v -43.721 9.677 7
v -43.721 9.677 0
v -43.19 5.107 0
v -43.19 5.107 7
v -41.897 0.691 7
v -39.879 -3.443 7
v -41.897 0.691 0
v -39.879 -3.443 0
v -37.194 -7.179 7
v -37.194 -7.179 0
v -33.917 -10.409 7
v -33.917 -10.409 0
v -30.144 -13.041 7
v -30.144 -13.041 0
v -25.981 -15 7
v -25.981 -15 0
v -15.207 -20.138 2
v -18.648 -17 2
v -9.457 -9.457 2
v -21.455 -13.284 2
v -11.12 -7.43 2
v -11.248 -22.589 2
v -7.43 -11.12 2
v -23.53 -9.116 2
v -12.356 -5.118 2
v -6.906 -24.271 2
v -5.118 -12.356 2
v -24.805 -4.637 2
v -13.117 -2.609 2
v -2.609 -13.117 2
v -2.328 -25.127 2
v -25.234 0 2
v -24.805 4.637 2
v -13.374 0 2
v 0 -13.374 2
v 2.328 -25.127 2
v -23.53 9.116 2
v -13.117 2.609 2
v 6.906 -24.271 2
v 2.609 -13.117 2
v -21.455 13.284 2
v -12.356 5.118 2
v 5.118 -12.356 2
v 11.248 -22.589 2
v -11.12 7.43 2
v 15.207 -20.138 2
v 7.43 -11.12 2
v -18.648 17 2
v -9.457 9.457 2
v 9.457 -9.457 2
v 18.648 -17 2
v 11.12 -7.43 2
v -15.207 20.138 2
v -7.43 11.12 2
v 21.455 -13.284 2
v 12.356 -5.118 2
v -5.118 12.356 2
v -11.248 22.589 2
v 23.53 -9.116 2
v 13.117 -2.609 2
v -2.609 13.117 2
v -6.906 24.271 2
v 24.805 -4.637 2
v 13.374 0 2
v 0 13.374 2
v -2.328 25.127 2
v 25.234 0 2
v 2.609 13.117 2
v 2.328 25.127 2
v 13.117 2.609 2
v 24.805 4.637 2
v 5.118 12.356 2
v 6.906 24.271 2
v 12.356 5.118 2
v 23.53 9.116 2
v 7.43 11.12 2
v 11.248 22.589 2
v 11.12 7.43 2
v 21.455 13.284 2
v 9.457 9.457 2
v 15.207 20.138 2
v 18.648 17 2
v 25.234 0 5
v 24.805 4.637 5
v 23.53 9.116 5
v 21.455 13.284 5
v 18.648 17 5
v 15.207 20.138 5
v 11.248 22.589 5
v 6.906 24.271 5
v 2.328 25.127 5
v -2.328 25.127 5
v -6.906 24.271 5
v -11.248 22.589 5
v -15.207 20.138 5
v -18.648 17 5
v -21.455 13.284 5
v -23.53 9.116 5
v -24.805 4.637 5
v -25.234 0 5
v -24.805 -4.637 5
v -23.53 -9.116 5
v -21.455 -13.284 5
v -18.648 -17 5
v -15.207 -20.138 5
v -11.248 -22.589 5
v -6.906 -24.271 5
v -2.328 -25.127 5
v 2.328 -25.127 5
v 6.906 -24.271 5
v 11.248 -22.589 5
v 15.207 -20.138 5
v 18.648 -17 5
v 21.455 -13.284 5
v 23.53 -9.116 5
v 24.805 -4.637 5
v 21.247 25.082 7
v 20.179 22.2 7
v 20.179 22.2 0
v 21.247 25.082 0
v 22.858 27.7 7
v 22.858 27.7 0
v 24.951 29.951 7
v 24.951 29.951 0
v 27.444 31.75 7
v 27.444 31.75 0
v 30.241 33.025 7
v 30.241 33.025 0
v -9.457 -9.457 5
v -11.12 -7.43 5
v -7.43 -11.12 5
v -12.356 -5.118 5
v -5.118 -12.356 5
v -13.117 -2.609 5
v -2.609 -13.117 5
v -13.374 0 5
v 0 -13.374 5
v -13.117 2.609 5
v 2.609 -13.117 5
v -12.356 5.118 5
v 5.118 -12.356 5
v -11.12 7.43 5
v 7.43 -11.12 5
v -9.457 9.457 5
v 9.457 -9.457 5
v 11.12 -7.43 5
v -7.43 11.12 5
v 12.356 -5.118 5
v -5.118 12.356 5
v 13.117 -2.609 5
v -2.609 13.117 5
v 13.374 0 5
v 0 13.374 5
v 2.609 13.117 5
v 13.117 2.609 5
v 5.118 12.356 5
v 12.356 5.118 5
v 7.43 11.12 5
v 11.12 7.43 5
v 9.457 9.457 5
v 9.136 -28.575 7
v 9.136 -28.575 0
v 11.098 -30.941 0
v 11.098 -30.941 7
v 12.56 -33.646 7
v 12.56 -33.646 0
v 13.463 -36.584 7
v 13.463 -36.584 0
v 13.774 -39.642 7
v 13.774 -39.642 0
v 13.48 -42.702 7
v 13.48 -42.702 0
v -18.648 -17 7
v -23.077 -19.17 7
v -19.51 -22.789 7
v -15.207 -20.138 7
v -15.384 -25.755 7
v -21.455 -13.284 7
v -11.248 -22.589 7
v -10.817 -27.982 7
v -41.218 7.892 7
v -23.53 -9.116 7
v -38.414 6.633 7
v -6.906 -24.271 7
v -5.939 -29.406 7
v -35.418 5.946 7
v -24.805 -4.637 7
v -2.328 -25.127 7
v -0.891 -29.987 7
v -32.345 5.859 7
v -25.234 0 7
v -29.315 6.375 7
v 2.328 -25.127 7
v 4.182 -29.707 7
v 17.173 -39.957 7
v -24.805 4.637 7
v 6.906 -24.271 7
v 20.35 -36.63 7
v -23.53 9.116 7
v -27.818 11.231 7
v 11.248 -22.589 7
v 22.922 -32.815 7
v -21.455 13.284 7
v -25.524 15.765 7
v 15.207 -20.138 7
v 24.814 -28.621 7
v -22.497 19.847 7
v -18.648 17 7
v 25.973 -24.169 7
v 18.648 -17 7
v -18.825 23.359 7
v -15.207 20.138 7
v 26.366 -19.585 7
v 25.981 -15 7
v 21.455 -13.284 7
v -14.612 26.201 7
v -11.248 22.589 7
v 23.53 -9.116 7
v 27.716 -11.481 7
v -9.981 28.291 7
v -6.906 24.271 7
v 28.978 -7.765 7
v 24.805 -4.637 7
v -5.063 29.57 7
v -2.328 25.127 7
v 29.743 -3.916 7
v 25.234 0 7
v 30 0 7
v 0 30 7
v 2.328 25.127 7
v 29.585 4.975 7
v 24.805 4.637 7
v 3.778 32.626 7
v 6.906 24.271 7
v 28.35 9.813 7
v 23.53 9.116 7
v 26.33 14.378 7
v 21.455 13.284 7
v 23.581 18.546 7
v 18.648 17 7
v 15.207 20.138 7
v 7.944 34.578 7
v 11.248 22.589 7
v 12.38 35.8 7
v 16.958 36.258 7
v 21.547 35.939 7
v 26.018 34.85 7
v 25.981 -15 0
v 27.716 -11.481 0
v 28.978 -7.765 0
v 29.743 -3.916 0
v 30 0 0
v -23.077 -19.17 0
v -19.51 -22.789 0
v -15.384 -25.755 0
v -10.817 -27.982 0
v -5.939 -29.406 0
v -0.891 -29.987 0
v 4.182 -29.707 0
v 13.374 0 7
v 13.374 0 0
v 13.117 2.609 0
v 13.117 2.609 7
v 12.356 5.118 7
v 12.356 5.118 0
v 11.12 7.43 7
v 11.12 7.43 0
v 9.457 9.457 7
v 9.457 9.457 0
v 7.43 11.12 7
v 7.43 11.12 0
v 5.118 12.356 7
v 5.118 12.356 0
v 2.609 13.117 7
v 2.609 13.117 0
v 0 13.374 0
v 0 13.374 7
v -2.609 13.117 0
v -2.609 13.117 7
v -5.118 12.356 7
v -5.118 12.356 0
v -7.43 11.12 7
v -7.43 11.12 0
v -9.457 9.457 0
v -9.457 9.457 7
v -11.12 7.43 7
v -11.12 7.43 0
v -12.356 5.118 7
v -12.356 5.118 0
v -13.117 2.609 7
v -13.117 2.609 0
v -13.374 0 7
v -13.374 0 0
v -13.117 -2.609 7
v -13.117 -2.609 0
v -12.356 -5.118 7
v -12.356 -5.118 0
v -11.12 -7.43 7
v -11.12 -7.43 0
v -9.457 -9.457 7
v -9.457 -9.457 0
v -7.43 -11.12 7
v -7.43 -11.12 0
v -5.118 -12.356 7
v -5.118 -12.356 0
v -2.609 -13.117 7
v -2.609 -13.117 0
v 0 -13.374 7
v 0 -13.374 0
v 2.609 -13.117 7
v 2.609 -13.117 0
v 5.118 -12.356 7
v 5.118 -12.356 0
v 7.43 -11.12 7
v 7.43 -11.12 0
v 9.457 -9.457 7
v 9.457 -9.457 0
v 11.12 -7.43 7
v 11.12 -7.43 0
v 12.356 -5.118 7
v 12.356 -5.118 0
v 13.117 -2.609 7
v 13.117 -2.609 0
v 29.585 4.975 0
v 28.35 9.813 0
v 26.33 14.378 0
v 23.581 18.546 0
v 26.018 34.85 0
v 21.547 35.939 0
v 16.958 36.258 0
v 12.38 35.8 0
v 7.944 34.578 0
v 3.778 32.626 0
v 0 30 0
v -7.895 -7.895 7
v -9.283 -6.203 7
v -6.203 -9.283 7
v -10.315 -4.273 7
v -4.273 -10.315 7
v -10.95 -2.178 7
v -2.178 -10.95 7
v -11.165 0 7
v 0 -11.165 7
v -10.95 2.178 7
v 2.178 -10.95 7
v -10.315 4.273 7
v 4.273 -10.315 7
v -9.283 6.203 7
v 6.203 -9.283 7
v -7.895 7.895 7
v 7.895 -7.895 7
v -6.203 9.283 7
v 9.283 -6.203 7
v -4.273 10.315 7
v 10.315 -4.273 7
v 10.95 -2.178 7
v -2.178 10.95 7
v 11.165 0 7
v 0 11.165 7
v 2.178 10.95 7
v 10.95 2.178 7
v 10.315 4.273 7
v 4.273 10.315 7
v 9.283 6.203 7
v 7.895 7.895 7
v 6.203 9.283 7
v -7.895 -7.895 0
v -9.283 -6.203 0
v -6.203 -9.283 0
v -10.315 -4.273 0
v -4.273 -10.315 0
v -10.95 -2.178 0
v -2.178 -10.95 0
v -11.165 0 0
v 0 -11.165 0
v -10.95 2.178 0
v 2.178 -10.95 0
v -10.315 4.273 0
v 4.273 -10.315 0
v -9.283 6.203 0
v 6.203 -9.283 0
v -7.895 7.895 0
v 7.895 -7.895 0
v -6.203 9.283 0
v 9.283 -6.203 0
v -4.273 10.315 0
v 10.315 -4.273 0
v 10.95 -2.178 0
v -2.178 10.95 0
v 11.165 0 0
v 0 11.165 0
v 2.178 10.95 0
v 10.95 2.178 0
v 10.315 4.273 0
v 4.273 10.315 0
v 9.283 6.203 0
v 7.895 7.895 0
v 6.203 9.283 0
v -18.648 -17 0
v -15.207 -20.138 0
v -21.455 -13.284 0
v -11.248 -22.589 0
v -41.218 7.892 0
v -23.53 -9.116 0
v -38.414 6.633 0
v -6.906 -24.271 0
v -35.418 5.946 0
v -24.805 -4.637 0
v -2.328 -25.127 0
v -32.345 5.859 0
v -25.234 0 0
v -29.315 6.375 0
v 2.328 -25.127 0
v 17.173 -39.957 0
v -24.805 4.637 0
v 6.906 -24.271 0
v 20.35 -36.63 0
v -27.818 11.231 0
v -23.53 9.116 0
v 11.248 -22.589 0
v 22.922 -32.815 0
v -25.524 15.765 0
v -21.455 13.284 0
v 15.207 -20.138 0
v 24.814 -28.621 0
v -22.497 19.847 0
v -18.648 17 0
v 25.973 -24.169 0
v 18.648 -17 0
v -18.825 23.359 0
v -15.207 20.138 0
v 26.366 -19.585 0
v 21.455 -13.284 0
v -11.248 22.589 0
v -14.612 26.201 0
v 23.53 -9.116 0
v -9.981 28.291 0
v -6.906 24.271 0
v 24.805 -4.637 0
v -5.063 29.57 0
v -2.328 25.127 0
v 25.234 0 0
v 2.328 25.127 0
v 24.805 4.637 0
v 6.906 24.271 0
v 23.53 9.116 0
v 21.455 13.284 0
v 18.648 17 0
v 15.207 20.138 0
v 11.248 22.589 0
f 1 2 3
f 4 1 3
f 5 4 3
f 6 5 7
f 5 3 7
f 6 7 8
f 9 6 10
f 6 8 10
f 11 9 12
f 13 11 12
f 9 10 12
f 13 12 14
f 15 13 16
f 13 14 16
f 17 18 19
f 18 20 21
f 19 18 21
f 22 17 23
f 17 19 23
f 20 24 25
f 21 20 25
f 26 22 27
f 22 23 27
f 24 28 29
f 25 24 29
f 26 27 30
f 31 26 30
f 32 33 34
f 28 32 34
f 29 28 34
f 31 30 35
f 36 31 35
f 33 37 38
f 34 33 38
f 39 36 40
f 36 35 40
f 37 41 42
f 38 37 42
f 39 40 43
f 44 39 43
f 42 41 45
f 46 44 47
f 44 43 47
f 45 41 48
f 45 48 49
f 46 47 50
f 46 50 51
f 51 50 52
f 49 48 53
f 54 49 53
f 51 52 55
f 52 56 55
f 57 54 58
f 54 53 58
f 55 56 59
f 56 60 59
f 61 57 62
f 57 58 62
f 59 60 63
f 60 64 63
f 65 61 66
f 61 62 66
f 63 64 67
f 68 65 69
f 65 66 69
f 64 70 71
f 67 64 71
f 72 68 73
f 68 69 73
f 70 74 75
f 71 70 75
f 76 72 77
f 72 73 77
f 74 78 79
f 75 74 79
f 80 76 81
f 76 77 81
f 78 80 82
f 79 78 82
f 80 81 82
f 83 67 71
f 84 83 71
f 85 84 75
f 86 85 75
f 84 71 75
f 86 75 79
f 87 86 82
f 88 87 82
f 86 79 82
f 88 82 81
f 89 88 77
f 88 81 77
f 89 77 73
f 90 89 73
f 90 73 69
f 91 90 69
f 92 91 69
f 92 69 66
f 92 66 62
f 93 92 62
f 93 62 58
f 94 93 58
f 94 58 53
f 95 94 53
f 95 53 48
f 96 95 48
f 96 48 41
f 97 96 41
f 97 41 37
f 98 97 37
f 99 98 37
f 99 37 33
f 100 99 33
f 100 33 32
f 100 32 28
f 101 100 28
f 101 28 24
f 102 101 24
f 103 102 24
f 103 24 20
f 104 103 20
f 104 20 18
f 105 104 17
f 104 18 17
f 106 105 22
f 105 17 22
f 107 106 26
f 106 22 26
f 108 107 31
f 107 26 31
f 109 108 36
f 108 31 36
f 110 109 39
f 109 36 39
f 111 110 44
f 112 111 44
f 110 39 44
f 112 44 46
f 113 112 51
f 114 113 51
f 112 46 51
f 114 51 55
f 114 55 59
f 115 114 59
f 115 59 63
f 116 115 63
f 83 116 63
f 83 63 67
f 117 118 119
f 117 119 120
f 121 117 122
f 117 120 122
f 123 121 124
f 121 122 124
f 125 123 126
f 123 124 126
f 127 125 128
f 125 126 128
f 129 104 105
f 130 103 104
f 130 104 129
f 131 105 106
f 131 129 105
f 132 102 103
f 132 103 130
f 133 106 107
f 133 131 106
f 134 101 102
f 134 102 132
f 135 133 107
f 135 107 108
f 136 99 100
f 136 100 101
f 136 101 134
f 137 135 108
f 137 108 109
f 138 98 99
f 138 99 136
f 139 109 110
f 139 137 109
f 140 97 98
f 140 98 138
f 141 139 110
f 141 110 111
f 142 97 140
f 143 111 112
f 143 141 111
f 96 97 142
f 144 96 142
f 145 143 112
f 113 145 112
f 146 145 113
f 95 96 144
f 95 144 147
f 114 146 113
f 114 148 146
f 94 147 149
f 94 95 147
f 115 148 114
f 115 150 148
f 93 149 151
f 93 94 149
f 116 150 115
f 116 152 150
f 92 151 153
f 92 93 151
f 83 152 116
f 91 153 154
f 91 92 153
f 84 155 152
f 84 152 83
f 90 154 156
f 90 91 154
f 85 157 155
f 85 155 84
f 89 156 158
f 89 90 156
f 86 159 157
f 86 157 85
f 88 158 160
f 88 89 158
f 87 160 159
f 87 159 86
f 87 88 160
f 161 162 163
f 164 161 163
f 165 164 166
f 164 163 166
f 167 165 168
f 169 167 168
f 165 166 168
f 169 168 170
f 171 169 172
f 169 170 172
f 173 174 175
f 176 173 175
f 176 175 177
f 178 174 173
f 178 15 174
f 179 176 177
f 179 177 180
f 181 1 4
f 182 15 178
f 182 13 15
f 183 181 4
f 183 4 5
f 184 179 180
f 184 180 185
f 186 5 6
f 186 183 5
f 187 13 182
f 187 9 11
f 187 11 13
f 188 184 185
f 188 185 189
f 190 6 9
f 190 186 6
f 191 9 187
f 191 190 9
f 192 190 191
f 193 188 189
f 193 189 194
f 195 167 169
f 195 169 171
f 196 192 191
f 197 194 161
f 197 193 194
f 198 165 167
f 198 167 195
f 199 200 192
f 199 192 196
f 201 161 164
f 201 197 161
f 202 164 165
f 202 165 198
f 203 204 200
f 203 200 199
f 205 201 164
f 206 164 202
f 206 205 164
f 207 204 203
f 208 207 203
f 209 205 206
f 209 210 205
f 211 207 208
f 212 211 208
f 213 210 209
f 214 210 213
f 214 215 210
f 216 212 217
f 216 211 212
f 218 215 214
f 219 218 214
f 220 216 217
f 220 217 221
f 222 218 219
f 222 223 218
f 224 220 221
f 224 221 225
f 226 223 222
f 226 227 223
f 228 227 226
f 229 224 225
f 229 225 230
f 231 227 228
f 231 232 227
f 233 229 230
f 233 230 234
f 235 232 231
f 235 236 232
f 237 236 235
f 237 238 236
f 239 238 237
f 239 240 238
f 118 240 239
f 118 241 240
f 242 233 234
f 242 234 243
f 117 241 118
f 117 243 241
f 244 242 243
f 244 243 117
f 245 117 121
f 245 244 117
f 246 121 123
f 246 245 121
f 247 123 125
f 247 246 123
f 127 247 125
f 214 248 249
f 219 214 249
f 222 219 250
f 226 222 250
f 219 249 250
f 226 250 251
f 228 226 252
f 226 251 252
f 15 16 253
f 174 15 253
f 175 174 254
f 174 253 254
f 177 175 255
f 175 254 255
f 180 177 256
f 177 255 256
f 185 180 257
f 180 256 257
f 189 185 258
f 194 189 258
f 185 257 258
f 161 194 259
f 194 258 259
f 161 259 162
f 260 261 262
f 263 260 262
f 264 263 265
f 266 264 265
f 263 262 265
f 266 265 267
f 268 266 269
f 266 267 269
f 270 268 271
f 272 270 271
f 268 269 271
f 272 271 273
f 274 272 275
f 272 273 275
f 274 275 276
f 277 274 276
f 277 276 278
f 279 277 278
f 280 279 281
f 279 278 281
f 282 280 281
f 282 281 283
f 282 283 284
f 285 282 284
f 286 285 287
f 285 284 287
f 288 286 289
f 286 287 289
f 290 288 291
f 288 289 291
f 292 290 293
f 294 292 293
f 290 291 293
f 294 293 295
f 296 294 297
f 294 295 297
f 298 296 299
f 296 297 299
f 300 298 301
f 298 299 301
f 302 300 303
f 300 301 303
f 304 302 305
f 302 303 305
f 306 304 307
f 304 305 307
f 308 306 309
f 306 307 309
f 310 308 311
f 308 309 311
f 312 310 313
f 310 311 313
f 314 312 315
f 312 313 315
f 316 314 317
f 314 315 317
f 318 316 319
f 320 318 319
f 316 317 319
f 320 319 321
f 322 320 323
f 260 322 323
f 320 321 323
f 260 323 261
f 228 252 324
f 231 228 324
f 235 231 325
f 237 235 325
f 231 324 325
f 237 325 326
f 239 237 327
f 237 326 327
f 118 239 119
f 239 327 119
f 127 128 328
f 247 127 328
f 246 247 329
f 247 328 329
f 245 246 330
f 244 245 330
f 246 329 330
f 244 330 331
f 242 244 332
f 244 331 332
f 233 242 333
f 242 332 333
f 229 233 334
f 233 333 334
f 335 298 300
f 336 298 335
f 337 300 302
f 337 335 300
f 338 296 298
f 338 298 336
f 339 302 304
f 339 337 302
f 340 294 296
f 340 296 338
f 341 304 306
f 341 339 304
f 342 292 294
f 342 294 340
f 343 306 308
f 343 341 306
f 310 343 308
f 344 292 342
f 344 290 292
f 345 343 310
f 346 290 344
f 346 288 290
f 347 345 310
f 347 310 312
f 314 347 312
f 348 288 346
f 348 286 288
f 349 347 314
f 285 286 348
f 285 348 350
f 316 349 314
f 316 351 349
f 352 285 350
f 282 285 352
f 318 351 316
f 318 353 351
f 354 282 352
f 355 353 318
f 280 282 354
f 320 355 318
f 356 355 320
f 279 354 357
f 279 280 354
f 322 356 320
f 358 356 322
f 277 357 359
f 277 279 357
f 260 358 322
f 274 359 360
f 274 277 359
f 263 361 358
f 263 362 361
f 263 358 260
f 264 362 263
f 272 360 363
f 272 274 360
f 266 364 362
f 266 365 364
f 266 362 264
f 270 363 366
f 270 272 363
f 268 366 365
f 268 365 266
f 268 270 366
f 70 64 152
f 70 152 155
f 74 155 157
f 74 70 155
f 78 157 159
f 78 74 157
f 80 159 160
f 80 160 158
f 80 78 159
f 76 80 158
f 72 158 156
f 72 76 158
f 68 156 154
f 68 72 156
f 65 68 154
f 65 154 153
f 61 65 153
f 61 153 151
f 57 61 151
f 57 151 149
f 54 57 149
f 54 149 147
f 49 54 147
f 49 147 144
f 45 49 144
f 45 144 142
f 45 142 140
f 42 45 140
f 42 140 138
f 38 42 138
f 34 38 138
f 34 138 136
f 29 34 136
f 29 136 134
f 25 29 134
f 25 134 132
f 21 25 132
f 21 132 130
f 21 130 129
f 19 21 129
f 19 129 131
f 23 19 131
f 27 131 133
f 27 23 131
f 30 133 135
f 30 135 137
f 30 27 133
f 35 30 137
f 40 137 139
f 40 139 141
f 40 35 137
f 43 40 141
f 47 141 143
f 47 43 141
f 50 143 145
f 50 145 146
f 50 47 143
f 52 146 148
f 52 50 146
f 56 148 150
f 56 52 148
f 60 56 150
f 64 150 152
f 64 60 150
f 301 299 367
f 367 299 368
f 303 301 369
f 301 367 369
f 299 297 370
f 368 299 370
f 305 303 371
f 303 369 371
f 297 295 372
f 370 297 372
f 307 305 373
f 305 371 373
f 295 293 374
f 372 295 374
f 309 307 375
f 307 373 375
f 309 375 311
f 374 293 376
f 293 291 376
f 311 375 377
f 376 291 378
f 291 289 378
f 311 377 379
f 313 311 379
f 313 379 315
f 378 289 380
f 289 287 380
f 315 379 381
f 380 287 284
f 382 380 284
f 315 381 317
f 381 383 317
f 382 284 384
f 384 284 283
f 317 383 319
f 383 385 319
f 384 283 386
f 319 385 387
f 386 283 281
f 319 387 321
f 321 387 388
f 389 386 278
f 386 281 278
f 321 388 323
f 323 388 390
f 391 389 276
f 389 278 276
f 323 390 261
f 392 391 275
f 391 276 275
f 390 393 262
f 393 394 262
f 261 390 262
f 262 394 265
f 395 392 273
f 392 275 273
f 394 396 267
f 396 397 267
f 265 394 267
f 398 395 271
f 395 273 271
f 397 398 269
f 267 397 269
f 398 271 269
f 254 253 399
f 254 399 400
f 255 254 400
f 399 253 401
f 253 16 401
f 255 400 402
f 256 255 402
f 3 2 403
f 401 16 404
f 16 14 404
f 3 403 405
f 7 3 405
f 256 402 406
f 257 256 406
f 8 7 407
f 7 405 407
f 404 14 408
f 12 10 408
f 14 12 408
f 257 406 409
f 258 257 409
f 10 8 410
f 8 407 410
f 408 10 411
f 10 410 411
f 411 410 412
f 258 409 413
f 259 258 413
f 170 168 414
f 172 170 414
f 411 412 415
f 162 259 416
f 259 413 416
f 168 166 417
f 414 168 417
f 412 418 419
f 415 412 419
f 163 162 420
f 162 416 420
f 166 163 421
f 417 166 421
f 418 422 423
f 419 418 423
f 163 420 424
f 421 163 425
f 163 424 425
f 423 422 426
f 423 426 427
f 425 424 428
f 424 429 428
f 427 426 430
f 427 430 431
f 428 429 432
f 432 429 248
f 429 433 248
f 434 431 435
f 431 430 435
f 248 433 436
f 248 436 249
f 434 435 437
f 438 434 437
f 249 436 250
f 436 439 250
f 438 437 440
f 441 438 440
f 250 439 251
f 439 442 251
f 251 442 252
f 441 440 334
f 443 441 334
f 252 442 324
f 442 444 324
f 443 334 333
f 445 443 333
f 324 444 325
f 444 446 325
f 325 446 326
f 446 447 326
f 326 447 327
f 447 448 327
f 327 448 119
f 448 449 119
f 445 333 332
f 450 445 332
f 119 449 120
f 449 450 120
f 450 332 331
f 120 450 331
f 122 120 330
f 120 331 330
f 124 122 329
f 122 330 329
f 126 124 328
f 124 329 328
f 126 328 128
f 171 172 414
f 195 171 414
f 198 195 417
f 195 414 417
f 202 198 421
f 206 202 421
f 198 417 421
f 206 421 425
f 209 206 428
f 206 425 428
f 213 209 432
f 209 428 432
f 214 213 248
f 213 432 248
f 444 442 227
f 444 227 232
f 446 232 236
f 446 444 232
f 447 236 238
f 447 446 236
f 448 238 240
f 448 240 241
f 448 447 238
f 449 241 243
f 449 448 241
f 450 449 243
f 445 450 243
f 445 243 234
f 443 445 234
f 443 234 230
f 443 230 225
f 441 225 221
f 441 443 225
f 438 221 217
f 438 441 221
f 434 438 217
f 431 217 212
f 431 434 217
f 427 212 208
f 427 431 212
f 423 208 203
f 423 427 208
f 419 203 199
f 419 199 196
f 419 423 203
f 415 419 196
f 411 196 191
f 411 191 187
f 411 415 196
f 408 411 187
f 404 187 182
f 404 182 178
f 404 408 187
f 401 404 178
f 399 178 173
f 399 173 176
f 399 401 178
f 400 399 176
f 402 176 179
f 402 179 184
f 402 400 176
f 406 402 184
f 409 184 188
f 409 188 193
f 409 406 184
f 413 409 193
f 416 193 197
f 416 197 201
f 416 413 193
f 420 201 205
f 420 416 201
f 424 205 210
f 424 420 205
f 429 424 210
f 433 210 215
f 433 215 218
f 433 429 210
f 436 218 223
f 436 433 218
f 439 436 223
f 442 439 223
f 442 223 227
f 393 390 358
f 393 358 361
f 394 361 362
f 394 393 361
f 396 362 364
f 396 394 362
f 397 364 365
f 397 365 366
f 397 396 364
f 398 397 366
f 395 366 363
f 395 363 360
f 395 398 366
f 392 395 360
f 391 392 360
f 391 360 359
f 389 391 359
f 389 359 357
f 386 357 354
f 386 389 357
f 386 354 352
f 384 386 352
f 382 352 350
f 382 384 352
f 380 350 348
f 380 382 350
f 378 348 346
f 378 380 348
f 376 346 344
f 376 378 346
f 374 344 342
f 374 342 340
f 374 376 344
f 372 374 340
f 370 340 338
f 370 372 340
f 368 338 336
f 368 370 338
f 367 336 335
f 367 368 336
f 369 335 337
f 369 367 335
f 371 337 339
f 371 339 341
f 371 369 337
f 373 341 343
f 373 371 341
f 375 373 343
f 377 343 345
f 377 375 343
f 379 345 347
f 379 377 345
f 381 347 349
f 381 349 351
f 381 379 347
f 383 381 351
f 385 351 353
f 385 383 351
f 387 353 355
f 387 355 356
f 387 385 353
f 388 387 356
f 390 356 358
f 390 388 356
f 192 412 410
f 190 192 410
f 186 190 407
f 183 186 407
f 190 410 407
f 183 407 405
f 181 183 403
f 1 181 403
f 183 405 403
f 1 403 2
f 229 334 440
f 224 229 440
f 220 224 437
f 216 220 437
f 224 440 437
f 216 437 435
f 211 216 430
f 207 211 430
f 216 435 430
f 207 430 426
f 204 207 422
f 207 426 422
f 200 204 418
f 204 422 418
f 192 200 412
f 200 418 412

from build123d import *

# Parameters (mm, degrees)
F0_R     = 13.3742316953
F0_R_2   = 11.165
F1_DEPTH = 7
F0_R_3   = 25.2344394366
F2_DEPTH = 5
F3_DEPTH = 2


with BuildPart() as f1:
    # F0 (on Top) → F1 (new body)
    with BuildSketch(Plane.XY):
        Circle(F0_R)
        Circle(F0_R_2, mode=Mode.SUBTRACT)
    extrude(amount=F1_DEPTH)


with BuildPart() as f1b:
    # F0 (on Top) → F1, piece 2 (new body)
    with BuildSketch(Plane.XY):
        with BuildLine():
            ThreePointArc((25.9807621135, -15), (28.9777747887, -7.7645713531), (30, 0))
            ThreePointArc((30, 0), (27.4350087398, 12.1375572273), (20.1786469702, 22.1995992408))
            ThreePointArc((20.1786469702, 22.1995992408), (10.8169316993, 27.9820297443), (0, 30))
            ThreePointArc((0, 30), (-18.8246827584, 23.3587525148), (-29.3147403815, 6.3754212698))
            ThreePointArc((-29.3147403815, 6.3754212698), (-29.6416144577, -4.6232772295), (-25.9807621135, -15))
            ThreePointArc((-25.9807621135, -15), (-10.8169316993, -27.9820297443), (9.1360934113, -28.5750205106))
            ThreePointArc((9.1360934113, -28.5750205106), (18.8246827584, -23.3587525148), (25.9807621135, -15))
        make_face()
        Circle(F0_R_3, mode=Mode.SUBTRACT)
        with BuildLine():
            ThreePointArc((0, 30), (10.8169316993, 27.9820297443), (20.1786469702, 22.1995992408))
            ThreePointArc((20.1786469702, 22.1995992408), (23.849043869, 28.8770888286), (30.2408803254, 33.0249927938))
            ThreePointArc((30.2408803254, 33.0249927938), (14.6589394966, 36.1261227315), (0, 30))
        make_face()
        with BuildLine():
            ThreePointArc((-25.9807621135, -15), (-29.6416144577, -4.6232772295), (-29.3147403815, 6.3754212698))
            ThreePointArc((-29.3147403815, 6.3754212698), (-36.9328144474, 6.2153334322), (-43.7209228819, 9.6768741977))
            ThreePointArc((-43.7209228819, 9.6768741977), (-38.615609774, -5.3680473692), (-25.9807621135, -15))
        make_face()
        with BuildLine():
            ThreePointArc((13.4800425565, -42.7018669915), (23.9566702775, -30.7580753623), (25.9807621135, -15))
            ThreePointArc((25.9807621135, -15), (18.8246827584, -23.3587525148), (9.1360934113, -28.5750205106))
            ThreePointArc((9.1360934113, -28.5750205106), (13.0837705784, -35.0924222608), (13.4800425565, -42.7018669915))
        make_face()
    extrude(amount=F1_DEPTH)


with BuildPart() as f2:
    # F0 (on Top) → F2 (new body)
    with BuildSketch(Plane.XY):
        Circle(F0_R_3)
        Circle(F0_R, mode=Mode.SUBTRACT)
    extrude(amount=F2_DEPTH)

    # F0 (on Top) → F3 (cut)
    with BuildSketch(Plane.XY):
        Circle(F0_R_3)
        Circle(F0_R, mode=Mode.SUBTRACT)
    extrude(amount=F3_DEPTH, mode=Mode.SUBTRACT)


solid = Compound([f1.part, f1b.part, f2.part])
